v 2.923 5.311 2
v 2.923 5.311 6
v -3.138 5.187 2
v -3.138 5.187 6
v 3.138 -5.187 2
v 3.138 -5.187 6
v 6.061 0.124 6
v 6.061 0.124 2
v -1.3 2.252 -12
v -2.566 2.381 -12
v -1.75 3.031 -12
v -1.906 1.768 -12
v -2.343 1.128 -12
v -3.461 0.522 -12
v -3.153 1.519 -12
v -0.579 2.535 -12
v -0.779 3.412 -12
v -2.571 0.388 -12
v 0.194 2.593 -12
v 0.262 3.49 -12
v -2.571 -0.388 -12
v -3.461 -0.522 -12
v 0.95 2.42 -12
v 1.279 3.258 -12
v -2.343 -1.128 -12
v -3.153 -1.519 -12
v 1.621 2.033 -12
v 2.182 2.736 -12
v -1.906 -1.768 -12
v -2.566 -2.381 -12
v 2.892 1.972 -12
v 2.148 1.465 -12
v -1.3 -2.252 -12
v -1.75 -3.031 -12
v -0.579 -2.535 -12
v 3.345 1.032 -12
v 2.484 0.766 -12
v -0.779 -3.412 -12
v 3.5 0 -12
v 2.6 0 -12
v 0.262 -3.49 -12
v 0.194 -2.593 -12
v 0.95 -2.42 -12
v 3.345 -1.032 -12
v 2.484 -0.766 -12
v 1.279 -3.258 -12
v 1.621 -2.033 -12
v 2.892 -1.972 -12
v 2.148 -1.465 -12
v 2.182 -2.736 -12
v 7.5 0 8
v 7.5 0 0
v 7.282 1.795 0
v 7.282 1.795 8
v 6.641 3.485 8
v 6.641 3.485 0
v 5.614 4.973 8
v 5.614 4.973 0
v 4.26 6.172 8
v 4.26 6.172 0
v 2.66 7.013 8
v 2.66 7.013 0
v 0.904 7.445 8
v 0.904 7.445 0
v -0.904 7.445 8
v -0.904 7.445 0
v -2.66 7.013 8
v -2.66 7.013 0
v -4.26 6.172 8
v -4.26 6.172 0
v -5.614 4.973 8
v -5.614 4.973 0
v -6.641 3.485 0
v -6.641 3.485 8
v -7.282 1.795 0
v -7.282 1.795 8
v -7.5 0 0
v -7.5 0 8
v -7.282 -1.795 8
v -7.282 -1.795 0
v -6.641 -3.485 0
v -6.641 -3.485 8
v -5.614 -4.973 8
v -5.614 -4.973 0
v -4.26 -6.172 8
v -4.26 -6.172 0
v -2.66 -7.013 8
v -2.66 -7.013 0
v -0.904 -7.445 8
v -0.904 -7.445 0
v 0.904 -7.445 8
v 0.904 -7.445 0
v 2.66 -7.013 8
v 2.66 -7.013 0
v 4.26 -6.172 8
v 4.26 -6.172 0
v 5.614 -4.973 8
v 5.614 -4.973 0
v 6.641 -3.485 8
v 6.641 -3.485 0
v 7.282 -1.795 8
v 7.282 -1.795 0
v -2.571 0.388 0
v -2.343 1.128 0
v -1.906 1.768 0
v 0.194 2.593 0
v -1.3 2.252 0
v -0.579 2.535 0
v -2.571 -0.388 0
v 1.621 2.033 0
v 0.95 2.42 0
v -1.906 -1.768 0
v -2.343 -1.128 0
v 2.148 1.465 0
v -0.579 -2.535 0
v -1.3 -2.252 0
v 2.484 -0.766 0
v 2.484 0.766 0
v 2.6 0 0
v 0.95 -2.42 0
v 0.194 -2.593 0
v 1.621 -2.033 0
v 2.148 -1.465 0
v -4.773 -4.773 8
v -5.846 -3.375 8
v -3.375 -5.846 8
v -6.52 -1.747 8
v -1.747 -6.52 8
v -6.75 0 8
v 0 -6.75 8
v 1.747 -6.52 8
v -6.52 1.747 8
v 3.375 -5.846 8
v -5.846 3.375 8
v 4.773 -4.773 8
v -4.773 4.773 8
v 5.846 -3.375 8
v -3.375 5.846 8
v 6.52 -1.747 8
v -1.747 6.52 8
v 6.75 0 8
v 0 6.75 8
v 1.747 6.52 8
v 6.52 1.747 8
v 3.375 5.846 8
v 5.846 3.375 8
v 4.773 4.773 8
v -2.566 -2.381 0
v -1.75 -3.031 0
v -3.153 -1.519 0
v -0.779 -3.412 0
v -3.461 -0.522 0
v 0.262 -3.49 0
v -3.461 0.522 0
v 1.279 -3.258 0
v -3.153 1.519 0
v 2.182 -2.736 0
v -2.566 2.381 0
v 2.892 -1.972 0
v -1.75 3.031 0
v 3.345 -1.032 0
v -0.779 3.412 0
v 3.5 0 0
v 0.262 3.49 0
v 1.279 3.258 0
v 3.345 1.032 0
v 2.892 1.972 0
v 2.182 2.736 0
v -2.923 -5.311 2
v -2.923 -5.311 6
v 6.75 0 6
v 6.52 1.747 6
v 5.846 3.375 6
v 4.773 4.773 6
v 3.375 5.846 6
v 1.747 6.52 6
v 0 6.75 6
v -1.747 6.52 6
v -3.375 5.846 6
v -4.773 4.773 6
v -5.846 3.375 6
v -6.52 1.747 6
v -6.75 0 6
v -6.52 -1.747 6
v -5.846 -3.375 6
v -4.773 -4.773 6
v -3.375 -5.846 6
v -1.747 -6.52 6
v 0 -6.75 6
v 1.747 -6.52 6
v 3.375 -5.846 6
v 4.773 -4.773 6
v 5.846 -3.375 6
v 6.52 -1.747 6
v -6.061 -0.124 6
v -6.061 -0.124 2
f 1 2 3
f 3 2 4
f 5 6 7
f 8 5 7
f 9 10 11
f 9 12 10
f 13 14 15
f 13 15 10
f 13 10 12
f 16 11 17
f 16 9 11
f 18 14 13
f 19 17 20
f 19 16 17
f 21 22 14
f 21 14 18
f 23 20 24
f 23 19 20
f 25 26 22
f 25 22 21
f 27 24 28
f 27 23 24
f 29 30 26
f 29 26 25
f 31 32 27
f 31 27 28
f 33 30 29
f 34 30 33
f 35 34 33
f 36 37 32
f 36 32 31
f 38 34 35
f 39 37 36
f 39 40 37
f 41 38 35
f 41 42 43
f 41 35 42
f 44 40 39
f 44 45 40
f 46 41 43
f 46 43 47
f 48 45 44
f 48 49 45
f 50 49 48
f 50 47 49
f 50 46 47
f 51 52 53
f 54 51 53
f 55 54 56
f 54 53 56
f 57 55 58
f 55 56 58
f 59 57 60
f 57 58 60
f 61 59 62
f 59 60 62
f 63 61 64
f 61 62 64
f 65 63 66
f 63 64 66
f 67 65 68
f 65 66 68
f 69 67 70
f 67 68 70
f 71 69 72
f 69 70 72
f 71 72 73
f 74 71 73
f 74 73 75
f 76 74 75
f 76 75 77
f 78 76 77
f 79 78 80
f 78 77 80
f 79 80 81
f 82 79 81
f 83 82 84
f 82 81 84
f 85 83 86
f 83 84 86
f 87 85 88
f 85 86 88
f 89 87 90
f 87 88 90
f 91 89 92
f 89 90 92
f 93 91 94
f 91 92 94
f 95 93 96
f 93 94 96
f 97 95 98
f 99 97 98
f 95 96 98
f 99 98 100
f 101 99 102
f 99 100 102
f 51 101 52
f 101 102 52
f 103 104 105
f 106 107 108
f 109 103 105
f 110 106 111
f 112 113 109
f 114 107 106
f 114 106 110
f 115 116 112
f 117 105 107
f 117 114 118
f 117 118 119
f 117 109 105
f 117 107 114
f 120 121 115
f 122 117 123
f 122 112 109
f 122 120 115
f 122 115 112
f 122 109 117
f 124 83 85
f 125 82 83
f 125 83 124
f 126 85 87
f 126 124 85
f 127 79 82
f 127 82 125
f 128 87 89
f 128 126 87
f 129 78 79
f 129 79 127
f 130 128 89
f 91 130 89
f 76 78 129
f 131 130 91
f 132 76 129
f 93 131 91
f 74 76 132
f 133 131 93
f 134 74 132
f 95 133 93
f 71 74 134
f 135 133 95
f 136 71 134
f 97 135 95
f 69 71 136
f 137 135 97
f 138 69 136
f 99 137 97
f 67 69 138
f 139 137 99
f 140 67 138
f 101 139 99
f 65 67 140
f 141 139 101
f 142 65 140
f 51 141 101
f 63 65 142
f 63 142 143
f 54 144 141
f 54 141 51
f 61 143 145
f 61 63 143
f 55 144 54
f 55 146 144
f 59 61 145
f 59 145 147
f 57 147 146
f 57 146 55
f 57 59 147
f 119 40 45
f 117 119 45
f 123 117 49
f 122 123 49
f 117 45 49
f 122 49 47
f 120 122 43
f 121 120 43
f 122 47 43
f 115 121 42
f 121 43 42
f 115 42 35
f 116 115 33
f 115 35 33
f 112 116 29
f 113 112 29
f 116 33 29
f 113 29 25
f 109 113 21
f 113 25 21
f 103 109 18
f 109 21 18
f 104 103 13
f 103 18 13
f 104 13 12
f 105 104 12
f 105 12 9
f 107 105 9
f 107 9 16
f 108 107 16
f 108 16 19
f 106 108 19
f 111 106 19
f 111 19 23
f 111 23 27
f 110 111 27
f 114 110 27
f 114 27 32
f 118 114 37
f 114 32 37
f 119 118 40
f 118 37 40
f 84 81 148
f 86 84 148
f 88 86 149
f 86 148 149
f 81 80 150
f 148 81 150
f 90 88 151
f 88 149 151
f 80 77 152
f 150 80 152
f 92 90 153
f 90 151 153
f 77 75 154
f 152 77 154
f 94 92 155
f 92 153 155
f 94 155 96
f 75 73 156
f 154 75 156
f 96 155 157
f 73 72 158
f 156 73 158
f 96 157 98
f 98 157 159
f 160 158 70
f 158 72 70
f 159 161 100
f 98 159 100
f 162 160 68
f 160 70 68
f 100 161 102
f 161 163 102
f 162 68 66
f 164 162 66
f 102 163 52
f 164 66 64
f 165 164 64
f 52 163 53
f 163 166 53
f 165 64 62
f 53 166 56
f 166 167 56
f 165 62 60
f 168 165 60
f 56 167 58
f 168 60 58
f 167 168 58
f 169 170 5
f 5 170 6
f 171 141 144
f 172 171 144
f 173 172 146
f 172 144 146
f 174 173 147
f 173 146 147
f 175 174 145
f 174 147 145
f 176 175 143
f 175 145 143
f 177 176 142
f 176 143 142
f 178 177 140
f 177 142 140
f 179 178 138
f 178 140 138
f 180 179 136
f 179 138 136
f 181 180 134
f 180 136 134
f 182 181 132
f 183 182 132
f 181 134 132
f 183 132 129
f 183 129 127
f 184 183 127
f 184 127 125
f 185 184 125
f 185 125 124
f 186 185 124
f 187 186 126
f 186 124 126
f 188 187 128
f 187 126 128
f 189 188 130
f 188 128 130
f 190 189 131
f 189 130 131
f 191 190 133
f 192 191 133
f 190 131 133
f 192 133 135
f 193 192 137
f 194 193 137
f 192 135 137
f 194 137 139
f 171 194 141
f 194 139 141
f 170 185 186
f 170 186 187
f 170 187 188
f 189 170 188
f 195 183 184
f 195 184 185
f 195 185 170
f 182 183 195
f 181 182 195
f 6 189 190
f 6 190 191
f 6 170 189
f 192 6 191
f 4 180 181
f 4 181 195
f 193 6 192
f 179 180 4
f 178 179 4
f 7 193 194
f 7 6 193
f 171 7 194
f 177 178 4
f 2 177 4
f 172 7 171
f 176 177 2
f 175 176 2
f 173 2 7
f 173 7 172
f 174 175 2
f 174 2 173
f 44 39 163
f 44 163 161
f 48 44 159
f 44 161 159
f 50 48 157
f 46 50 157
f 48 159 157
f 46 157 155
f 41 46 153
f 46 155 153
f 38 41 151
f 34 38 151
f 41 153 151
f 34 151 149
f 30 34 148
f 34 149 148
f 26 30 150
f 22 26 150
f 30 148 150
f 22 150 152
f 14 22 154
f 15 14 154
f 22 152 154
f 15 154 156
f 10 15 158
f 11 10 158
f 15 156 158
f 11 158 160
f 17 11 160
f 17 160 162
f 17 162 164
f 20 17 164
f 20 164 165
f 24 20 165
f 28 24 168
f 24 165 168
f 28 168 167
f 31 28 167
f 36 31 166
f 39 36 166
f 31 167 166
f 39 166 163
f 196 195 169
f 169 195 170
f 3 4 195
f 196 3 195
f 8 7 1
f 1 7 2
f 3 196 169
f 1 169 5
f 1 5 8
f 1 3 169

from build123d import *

# Parameters (mm, degrees)
F0_R     = 7.5
F1_DEPTH = 8
F2_R     = 6.75
F3_DEPTH = 2
F5_DEPTH = 4
F6_R     = 3.5
F7_DEPTH = 12
F8_R     = 2.6
F9_DEPTH = 12


with BuildPart() as f1:
    # F0 (on Top) → F1 (new body)
    with BuildSketch(Plane.XY):
        Circle(F0_R)
    extrude(amount=F1_DEPTH)

    # F2 (on face) → F3 (cut)
    with BuildSketch(Plane.XY.offset(8)):
        Circle(F2_R)
    extrude(amount=-F3_DEPTH, mode=Mode.SUBTRACT)

    # F4 (on face) → F5 (cut)
    with BuildSketch(Plane.XY.offset(6)):
        Polygon((6.060904, 0.124281), (2.922821, 5.311037), (-3.138083, 5.186756), (-6.060904, -0.124281), (-2.922821, -5.311037), (3.138083, -5.186756), align=None)
    extrude(amount=-F5_DEPTH, mode=Mode.SUBTRACT)

    # F6 (on face) → F7 (join)
    with BuildSketch(Plane(origin=(0, 0, 0), x_dir=(1, 0, 0), z_dir=(0, 0, -1))):
        Circle(F6_R)
    extrude(amount=F7_DEPTH)

    # F8 (on face) → F9 (cut)
    with BuildSketch(Plane(origin=(0, 0, -12), x_dir=(1, 0, 0), z_dir=(0, 0, -1))):
        Circle(F8_R)
    extrude(amount=-F9_DEPTH, mode=Mode.SUBTRACT)


solid = f1.part
